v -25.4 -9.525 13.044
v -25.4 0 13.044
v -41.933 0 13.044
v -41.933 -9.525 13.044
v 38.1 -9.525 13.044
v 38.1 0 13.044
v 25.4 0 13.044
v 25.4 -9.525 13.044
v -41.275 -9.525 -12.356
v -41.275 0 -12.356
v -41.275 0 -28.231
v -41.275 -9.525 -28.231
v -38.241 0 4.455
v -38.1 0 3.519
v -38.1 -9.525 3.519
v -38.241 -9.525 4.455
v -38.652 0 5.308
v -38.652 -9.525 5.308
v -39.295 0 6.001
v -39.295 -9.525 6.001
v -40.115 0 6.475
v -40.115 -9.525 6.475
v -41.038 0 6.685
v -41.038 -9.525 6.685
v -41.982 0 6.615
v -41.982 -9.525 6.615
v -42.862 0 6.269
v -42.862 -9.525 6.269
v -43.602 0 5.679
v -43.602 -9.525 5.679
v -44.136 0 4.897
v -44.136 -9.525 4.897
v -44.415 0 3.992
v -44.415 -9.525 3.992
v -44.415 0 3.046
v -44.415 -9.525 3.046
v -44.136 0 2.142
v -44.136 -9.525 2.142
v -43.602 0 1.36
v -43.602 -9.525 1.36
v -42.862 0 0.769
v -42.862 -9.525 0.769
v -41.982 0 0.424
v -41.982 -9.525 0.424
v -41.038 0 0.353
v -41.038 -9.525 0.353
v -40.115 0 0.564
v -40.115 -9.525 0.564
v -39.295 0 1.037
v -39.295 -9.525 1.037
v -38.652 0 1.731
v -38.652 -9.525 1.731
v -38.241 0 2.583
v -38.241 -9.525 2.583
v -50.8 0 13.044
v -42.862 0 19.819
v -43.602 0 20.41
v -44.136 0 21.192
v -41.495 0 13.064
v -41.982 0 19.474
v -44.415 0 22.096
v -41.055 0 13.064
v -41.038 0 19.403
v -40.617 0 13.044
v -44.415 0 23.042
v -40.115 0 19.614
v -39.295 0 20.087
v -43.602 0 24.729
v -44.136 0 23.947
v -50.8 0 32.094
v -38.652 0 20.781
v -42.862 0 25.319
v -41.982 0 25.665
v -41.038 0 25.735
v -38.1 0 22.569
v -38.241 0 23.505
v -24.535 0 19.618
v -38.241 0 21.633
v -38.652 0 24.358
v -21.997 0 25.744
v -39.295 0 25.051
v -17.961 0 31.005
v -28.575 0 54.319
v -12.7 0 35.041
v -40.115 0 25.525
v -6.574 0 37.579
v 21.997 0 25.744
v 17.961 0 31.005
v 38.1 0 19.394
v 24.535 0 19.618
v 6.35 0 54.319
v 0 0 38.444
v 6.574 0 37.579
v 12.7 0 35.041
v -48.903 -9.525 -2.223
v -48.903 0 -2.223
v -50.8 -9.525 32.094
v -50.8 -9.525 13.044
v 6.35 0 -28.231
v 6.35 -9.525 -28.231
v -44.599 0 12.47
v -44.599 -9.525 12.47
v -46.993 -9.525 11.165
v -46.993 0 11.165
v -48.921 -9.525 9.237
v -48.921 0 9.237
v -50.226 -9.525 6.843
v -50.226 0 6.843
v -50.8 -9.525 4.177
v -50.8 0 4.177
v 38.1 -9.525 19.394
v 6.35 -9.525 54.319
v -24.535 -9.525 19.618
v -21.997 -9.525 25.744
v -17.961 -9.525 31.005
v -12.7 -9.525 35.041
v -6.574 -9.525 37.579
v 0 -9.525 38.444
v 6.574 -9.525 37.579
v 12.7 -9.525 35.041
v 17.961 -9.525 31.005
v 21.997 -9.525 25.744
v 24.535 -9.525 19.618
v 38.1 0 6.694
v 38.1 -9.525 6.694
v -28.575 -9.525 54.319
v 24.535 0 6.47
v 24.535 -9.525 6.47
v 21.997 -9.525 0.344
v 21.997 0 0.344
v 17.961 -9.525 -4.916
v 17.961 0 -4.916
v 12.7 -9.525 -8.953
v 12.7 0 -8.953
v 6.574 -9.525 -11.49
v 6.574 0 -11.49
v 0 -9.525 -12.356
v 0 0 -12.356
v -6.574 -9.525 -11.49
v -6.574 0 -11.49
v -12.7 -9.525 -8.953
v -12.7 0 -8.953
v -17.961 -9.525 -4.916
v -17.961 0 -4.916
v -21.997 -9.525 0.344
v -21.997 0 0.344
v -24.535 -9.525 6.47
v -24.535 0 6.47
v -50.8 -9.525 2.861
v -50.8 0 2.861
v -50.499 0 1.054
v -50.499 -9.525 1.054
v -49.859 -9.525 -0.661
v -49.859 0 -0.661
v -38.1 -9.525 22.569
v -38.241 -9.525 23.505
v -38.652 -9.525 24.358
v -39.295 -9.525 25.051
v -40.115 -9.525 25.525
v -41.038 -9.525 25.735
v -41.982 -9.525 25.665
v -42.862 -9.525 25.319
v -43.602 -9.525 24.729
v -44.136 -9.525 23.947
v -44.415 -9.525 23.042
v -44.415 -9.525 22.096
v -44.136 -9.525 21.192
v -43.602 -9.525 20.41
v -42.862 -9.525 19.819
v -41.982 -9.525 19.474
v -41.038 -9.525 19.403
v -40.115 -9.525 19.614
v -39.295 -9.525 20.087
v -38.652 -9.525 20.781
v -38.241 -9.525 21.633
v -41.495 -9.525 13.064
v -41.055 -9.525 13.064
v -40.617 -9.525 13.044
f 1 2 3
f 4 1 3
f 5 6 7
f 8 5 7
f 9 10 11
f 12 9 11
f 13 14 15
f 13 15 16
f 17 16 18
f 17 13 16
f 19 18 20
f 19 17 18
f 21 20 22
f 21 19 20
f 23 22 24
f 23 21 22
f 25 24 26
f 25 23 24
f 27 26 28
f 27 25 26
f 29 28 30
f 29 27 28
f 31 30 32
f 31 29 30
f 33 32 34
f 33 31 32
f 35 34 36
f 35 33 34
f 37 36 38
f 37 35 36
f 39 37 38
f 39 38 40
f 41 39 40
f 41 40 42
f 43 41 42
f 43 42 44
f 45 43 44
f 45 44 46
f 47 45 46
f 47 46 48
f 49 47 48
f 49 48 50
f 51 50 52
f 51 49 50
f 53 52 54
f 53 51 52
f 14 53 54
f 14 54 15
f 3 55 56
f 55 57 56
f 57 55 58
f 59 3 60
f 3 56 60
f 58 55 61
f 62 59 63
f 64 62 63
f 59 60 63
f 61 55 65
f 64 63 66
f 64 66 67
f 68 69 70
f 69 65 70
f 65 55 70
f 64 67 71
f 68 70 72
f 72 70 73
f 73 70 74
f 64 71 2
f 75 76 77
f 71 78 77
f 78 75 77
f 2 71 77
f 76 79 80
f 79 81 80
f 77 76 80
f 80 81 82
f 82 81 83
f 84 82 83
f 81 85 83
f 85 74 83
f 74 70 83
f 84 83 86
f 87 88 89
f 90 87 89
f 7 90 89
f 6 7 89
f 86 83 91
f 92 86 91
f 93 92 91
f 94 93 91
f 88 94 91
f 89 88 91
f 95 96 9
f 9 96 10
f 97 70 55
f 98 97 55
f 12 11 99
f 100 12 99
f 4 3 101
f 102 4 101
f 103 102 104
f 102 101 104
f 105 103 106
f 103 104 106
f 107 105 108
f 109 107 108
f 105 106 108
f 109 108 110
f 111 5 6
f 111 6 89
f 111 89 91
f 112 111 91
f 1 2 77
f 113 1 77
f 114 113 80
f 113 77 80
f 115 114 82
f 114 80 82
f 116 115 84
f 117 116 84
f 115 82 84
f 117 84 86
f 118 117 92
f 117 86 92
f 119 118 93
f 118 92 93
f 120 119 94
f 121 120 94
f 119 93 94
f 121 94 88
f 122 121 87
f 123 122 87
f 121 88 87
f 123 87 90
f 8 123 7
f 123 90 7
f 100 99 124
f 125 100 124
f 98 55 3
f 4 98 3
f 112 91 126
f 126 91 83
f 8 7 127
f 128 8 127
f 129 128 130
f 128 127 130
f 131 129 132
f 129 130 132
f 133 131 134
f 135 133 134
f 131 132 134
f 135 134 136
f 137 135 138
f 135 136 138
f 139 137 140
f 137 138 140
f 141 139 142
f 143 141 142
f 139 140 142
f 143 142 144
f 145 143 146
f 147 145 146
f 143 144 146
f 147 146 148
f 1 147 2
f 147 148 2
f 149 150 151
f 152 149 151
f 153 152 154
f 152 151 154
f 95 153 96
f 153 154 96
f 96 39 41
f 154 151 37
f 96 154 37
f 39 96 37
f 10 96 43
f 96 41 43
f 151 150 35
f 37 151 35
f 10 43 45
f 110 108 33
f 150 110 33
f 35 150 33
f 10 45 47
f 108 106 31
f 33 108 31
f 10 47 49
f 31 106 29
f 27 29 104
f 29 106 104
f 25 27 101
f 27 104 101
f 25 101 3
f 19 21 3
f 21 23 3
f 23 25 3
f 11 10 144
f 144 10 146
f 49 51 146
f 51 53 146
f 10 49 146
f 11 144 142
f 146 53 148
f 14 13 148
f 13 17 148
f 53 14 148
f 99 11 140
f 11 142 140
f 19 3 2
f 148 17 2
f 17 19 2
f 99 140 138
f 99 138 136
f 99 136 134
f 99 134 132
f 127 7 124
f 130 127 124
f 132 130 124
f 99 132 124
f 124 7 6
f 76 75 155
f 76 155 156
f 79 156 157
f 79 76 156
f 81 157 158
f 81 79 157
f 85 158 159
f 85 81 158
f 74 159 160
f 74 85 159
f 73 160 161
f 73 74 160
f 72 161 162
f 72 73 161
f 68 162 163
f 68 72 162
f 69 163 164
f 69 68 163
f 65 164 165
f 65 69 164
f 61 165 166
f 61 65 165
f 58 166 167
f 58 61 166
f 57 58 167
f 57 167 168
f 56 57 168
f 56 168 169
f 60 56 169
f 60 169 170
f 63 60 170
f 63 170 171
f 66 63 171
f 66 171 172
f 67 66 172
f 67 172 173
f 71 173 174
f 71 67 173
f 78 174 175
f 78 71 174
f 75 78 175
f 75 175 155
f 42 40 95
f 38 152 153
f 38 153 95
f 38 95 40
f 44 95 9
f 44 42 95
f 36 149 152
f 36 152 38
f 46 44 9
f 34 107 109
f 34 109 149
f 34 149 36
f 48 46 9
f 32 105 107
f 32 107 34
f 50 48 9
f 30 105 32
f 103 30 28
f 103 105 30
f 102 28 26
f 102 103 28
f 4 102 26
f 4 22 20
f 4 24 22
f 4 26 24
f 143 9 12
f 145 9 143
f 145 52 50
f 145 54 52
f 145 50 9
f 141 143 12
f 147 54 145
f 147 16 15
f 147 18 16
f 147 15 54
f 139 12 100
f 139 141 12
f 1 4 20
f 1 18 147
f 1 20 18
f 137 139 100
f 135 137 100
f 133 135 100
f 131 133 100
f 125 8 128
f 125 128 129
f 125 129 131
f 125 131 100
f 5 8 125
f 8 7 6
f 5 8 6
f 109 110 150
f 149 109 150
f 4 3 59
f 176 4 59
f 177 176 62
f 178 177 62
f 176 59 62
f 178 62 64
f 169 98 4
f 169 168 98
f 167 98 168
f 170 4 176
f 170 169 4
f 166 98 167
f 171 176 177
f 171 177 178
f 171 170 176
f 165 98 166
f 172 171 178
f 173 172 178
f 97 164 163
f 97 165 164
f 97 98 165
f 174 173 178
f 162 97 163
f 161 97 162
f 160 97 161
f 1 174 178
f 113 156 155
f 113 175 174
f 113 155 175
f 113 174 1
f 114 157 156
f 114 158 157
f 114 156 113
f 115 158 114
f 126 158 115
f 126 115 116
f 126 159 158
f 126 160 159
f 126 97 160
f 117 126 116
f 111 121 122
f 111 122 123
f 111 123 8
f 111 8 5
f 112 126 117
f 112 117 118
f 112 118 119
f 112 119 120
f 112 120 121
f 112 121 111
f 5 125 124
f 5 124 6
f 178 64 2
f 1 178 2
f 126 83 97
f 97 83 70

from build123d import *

# Parameters (mm, degrees)
F0_R     = 3.175
F1_DEPTH = 9.525
F2_DEPTH = 9.525


with BuildPart() as f1:
    # F0 (on Front) → F1 (new body)
    with BuildSketch(Plane.XZ):
        with BuildLine():
            Line((6.35, 54.319108), (-28.575, 54.319108))
            Line((-28.575, 54.319108), (-50.8, 32.094108))
            Line((-50.8, 32.094108), (-50.8, 13.044108))
            Line((-50.8, 13.044108), (-41.933352, 13.044108))
            ThreePointArc((-41.933352, 13.044108), (-41.275, 13.066833), (-40.616648, 13.044108))
            Line((-40.616648, 13.044108), (-25.4, 13.044108))
            ThreePointArc((-25.4, 13.044108), (0, 38.444108), (25.4, 13.044108))
            Line((25.4, 13.044108), (38.1, 13.044108))
            Line((38.1, 13.044108), (38.1, 19.394108))
            Line((38.1, 19.394108), (6.35, 54.319108))
        make_face()
        with Locations((-41.275, 22.569108)):
            Circle(F0_R, mode=Mode.SUBTRACT)
    extrude(amount=F1_DEPTH)


with BuildPart() as f2:
    # F0 (on Front) → F2 (new body)
    with BuildSketch(Plane.XZ):
        with BuildLine():
            Line((38.1, 6.694108), (38.1, 13.044108))
            Line((38.1, 13.044108), (25.4, 13.044108))
            ThreePointArc((25.4, 13.044108), (0, -12.355892), (-25.4, 13.044108))
            Line((-25.4, 13.044108), (-40.616648, 13.044108))
            Line((-40.616648, 13.044108), (-41.933352, 13.044108))
            ThreePointArc((-41.933352, 13.044108), (-48.026261, 10.270369), (-50.8, 4.177461))
            Line((-50.8, 4.177461), (-50.8, 2.860756))
            ThreePointArc((-50.8, 2.860756), (-50.220234, 0.18117), (-48.90291, -2.223194))
            Line((-48.90291, -2.223194), (-41.275, -12.355892))
            Line((-41.275, -12.355892), (-41.275, -28.230892))
            Line((-41.275, -28.230892), (6.35, -28.230892))
            Line((6.35, -28.230892), (38.1, 6.694108))
        make_face()
        with Locations((-41.275, 3.519108)):
            Circle(F0_R, mode=Mode.SUBTRACT)
    extrude(amount=F2_DEPTH)


solid = Compound([f1.part, f2.part])
